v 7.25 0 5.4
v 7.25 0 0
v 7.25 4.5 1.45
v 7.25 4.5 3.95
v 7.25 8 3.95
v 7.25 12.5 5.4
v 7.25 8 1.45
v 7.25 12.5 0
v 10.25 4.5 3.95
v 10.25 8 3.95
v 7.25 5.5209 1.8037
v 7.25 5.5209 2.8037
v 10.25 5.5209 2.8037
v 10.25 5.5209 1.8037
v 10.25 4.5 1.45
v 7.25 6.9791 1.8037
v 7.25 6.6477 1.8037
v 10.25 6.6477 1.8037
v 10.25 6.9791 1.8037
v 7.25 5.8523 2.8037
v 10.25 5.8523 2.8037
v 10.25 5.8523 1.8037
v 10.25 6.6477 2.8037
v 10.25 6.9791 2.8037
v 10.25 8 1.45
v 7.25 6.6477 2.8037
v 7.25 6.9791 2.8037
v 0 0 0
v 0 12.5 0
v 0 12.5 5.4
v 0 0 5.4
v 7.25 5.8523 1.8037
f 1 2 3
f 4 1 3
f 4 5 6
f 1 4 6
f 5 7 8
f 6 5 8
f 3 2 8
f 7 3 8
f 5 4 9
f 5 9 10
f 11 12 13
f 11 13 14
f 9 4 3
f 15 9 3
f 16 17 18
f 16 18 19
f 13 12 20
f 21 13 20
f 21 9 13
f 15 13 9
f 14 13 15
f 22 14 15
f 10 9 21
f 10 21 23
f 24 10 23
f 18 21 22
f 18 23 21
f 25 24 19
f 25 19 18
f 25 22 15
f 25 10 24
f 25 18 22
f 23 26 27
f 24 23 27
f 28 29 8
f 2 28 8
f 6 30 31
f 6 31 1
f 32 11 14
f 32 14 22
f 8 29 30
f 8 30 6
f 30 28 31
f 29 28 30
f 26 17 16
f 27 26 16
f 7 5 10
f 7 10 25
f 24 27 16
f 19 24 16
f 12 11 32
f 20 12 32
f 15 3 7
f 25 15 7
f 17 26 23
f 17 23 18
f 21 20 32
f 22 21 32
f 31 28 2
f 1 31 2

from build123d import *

# Parameters (mm, degrees)
SKETCH1_W           = 7.25
SKETCH1_H           = 12.5
BOSS_EXTRUDE1_DEPTH = 5.4
SKETCH3_W           = 2.5
SKETCH3_H           = 3.5
SKETCH3_W_2         = 1
SKETCH3_H_2         = 0.331350256
BOSS_EXTRUDE2_DEPTH = 3


with BuildPart() as part:
    # Sketch1 → Boss-Extrude1 (new body)
    with BuildSketch(Plane.XY):
        with Locations((3.625, 6.25)):
            Rectangle(SKETCH1_W, SKETCH1_H)
    extrude(amount=BOSS_EXTRUDE1_DEPTH)

    # Sketch3 → Boss-Extrude2 (add)
    with BuildSketch(Plane(origin=(7.25, 0, 0), x_dir=(0, 0, -1), z_dir=(1, 0, 0))):
        with Locations((-2.7, 6.25)):
            Rectangle(SKETCH3_W, SKETCH3_H)
        with Locations((-2.303664878, 5.686580017)):
            Rectangle(SKETCH3_W_2, SKETCH3_H_2, mode=Mode.SUBTRACT)
        with Locations((-2.303664878, 6.813419983)):
            Rectangle(SKETCH3_W_2, SKETCH3_H_2, mode=Mode.SUBTRACT)
    extrude(amount=BOSS_EXTRUDE2_DEPTH)


solid = part.part
